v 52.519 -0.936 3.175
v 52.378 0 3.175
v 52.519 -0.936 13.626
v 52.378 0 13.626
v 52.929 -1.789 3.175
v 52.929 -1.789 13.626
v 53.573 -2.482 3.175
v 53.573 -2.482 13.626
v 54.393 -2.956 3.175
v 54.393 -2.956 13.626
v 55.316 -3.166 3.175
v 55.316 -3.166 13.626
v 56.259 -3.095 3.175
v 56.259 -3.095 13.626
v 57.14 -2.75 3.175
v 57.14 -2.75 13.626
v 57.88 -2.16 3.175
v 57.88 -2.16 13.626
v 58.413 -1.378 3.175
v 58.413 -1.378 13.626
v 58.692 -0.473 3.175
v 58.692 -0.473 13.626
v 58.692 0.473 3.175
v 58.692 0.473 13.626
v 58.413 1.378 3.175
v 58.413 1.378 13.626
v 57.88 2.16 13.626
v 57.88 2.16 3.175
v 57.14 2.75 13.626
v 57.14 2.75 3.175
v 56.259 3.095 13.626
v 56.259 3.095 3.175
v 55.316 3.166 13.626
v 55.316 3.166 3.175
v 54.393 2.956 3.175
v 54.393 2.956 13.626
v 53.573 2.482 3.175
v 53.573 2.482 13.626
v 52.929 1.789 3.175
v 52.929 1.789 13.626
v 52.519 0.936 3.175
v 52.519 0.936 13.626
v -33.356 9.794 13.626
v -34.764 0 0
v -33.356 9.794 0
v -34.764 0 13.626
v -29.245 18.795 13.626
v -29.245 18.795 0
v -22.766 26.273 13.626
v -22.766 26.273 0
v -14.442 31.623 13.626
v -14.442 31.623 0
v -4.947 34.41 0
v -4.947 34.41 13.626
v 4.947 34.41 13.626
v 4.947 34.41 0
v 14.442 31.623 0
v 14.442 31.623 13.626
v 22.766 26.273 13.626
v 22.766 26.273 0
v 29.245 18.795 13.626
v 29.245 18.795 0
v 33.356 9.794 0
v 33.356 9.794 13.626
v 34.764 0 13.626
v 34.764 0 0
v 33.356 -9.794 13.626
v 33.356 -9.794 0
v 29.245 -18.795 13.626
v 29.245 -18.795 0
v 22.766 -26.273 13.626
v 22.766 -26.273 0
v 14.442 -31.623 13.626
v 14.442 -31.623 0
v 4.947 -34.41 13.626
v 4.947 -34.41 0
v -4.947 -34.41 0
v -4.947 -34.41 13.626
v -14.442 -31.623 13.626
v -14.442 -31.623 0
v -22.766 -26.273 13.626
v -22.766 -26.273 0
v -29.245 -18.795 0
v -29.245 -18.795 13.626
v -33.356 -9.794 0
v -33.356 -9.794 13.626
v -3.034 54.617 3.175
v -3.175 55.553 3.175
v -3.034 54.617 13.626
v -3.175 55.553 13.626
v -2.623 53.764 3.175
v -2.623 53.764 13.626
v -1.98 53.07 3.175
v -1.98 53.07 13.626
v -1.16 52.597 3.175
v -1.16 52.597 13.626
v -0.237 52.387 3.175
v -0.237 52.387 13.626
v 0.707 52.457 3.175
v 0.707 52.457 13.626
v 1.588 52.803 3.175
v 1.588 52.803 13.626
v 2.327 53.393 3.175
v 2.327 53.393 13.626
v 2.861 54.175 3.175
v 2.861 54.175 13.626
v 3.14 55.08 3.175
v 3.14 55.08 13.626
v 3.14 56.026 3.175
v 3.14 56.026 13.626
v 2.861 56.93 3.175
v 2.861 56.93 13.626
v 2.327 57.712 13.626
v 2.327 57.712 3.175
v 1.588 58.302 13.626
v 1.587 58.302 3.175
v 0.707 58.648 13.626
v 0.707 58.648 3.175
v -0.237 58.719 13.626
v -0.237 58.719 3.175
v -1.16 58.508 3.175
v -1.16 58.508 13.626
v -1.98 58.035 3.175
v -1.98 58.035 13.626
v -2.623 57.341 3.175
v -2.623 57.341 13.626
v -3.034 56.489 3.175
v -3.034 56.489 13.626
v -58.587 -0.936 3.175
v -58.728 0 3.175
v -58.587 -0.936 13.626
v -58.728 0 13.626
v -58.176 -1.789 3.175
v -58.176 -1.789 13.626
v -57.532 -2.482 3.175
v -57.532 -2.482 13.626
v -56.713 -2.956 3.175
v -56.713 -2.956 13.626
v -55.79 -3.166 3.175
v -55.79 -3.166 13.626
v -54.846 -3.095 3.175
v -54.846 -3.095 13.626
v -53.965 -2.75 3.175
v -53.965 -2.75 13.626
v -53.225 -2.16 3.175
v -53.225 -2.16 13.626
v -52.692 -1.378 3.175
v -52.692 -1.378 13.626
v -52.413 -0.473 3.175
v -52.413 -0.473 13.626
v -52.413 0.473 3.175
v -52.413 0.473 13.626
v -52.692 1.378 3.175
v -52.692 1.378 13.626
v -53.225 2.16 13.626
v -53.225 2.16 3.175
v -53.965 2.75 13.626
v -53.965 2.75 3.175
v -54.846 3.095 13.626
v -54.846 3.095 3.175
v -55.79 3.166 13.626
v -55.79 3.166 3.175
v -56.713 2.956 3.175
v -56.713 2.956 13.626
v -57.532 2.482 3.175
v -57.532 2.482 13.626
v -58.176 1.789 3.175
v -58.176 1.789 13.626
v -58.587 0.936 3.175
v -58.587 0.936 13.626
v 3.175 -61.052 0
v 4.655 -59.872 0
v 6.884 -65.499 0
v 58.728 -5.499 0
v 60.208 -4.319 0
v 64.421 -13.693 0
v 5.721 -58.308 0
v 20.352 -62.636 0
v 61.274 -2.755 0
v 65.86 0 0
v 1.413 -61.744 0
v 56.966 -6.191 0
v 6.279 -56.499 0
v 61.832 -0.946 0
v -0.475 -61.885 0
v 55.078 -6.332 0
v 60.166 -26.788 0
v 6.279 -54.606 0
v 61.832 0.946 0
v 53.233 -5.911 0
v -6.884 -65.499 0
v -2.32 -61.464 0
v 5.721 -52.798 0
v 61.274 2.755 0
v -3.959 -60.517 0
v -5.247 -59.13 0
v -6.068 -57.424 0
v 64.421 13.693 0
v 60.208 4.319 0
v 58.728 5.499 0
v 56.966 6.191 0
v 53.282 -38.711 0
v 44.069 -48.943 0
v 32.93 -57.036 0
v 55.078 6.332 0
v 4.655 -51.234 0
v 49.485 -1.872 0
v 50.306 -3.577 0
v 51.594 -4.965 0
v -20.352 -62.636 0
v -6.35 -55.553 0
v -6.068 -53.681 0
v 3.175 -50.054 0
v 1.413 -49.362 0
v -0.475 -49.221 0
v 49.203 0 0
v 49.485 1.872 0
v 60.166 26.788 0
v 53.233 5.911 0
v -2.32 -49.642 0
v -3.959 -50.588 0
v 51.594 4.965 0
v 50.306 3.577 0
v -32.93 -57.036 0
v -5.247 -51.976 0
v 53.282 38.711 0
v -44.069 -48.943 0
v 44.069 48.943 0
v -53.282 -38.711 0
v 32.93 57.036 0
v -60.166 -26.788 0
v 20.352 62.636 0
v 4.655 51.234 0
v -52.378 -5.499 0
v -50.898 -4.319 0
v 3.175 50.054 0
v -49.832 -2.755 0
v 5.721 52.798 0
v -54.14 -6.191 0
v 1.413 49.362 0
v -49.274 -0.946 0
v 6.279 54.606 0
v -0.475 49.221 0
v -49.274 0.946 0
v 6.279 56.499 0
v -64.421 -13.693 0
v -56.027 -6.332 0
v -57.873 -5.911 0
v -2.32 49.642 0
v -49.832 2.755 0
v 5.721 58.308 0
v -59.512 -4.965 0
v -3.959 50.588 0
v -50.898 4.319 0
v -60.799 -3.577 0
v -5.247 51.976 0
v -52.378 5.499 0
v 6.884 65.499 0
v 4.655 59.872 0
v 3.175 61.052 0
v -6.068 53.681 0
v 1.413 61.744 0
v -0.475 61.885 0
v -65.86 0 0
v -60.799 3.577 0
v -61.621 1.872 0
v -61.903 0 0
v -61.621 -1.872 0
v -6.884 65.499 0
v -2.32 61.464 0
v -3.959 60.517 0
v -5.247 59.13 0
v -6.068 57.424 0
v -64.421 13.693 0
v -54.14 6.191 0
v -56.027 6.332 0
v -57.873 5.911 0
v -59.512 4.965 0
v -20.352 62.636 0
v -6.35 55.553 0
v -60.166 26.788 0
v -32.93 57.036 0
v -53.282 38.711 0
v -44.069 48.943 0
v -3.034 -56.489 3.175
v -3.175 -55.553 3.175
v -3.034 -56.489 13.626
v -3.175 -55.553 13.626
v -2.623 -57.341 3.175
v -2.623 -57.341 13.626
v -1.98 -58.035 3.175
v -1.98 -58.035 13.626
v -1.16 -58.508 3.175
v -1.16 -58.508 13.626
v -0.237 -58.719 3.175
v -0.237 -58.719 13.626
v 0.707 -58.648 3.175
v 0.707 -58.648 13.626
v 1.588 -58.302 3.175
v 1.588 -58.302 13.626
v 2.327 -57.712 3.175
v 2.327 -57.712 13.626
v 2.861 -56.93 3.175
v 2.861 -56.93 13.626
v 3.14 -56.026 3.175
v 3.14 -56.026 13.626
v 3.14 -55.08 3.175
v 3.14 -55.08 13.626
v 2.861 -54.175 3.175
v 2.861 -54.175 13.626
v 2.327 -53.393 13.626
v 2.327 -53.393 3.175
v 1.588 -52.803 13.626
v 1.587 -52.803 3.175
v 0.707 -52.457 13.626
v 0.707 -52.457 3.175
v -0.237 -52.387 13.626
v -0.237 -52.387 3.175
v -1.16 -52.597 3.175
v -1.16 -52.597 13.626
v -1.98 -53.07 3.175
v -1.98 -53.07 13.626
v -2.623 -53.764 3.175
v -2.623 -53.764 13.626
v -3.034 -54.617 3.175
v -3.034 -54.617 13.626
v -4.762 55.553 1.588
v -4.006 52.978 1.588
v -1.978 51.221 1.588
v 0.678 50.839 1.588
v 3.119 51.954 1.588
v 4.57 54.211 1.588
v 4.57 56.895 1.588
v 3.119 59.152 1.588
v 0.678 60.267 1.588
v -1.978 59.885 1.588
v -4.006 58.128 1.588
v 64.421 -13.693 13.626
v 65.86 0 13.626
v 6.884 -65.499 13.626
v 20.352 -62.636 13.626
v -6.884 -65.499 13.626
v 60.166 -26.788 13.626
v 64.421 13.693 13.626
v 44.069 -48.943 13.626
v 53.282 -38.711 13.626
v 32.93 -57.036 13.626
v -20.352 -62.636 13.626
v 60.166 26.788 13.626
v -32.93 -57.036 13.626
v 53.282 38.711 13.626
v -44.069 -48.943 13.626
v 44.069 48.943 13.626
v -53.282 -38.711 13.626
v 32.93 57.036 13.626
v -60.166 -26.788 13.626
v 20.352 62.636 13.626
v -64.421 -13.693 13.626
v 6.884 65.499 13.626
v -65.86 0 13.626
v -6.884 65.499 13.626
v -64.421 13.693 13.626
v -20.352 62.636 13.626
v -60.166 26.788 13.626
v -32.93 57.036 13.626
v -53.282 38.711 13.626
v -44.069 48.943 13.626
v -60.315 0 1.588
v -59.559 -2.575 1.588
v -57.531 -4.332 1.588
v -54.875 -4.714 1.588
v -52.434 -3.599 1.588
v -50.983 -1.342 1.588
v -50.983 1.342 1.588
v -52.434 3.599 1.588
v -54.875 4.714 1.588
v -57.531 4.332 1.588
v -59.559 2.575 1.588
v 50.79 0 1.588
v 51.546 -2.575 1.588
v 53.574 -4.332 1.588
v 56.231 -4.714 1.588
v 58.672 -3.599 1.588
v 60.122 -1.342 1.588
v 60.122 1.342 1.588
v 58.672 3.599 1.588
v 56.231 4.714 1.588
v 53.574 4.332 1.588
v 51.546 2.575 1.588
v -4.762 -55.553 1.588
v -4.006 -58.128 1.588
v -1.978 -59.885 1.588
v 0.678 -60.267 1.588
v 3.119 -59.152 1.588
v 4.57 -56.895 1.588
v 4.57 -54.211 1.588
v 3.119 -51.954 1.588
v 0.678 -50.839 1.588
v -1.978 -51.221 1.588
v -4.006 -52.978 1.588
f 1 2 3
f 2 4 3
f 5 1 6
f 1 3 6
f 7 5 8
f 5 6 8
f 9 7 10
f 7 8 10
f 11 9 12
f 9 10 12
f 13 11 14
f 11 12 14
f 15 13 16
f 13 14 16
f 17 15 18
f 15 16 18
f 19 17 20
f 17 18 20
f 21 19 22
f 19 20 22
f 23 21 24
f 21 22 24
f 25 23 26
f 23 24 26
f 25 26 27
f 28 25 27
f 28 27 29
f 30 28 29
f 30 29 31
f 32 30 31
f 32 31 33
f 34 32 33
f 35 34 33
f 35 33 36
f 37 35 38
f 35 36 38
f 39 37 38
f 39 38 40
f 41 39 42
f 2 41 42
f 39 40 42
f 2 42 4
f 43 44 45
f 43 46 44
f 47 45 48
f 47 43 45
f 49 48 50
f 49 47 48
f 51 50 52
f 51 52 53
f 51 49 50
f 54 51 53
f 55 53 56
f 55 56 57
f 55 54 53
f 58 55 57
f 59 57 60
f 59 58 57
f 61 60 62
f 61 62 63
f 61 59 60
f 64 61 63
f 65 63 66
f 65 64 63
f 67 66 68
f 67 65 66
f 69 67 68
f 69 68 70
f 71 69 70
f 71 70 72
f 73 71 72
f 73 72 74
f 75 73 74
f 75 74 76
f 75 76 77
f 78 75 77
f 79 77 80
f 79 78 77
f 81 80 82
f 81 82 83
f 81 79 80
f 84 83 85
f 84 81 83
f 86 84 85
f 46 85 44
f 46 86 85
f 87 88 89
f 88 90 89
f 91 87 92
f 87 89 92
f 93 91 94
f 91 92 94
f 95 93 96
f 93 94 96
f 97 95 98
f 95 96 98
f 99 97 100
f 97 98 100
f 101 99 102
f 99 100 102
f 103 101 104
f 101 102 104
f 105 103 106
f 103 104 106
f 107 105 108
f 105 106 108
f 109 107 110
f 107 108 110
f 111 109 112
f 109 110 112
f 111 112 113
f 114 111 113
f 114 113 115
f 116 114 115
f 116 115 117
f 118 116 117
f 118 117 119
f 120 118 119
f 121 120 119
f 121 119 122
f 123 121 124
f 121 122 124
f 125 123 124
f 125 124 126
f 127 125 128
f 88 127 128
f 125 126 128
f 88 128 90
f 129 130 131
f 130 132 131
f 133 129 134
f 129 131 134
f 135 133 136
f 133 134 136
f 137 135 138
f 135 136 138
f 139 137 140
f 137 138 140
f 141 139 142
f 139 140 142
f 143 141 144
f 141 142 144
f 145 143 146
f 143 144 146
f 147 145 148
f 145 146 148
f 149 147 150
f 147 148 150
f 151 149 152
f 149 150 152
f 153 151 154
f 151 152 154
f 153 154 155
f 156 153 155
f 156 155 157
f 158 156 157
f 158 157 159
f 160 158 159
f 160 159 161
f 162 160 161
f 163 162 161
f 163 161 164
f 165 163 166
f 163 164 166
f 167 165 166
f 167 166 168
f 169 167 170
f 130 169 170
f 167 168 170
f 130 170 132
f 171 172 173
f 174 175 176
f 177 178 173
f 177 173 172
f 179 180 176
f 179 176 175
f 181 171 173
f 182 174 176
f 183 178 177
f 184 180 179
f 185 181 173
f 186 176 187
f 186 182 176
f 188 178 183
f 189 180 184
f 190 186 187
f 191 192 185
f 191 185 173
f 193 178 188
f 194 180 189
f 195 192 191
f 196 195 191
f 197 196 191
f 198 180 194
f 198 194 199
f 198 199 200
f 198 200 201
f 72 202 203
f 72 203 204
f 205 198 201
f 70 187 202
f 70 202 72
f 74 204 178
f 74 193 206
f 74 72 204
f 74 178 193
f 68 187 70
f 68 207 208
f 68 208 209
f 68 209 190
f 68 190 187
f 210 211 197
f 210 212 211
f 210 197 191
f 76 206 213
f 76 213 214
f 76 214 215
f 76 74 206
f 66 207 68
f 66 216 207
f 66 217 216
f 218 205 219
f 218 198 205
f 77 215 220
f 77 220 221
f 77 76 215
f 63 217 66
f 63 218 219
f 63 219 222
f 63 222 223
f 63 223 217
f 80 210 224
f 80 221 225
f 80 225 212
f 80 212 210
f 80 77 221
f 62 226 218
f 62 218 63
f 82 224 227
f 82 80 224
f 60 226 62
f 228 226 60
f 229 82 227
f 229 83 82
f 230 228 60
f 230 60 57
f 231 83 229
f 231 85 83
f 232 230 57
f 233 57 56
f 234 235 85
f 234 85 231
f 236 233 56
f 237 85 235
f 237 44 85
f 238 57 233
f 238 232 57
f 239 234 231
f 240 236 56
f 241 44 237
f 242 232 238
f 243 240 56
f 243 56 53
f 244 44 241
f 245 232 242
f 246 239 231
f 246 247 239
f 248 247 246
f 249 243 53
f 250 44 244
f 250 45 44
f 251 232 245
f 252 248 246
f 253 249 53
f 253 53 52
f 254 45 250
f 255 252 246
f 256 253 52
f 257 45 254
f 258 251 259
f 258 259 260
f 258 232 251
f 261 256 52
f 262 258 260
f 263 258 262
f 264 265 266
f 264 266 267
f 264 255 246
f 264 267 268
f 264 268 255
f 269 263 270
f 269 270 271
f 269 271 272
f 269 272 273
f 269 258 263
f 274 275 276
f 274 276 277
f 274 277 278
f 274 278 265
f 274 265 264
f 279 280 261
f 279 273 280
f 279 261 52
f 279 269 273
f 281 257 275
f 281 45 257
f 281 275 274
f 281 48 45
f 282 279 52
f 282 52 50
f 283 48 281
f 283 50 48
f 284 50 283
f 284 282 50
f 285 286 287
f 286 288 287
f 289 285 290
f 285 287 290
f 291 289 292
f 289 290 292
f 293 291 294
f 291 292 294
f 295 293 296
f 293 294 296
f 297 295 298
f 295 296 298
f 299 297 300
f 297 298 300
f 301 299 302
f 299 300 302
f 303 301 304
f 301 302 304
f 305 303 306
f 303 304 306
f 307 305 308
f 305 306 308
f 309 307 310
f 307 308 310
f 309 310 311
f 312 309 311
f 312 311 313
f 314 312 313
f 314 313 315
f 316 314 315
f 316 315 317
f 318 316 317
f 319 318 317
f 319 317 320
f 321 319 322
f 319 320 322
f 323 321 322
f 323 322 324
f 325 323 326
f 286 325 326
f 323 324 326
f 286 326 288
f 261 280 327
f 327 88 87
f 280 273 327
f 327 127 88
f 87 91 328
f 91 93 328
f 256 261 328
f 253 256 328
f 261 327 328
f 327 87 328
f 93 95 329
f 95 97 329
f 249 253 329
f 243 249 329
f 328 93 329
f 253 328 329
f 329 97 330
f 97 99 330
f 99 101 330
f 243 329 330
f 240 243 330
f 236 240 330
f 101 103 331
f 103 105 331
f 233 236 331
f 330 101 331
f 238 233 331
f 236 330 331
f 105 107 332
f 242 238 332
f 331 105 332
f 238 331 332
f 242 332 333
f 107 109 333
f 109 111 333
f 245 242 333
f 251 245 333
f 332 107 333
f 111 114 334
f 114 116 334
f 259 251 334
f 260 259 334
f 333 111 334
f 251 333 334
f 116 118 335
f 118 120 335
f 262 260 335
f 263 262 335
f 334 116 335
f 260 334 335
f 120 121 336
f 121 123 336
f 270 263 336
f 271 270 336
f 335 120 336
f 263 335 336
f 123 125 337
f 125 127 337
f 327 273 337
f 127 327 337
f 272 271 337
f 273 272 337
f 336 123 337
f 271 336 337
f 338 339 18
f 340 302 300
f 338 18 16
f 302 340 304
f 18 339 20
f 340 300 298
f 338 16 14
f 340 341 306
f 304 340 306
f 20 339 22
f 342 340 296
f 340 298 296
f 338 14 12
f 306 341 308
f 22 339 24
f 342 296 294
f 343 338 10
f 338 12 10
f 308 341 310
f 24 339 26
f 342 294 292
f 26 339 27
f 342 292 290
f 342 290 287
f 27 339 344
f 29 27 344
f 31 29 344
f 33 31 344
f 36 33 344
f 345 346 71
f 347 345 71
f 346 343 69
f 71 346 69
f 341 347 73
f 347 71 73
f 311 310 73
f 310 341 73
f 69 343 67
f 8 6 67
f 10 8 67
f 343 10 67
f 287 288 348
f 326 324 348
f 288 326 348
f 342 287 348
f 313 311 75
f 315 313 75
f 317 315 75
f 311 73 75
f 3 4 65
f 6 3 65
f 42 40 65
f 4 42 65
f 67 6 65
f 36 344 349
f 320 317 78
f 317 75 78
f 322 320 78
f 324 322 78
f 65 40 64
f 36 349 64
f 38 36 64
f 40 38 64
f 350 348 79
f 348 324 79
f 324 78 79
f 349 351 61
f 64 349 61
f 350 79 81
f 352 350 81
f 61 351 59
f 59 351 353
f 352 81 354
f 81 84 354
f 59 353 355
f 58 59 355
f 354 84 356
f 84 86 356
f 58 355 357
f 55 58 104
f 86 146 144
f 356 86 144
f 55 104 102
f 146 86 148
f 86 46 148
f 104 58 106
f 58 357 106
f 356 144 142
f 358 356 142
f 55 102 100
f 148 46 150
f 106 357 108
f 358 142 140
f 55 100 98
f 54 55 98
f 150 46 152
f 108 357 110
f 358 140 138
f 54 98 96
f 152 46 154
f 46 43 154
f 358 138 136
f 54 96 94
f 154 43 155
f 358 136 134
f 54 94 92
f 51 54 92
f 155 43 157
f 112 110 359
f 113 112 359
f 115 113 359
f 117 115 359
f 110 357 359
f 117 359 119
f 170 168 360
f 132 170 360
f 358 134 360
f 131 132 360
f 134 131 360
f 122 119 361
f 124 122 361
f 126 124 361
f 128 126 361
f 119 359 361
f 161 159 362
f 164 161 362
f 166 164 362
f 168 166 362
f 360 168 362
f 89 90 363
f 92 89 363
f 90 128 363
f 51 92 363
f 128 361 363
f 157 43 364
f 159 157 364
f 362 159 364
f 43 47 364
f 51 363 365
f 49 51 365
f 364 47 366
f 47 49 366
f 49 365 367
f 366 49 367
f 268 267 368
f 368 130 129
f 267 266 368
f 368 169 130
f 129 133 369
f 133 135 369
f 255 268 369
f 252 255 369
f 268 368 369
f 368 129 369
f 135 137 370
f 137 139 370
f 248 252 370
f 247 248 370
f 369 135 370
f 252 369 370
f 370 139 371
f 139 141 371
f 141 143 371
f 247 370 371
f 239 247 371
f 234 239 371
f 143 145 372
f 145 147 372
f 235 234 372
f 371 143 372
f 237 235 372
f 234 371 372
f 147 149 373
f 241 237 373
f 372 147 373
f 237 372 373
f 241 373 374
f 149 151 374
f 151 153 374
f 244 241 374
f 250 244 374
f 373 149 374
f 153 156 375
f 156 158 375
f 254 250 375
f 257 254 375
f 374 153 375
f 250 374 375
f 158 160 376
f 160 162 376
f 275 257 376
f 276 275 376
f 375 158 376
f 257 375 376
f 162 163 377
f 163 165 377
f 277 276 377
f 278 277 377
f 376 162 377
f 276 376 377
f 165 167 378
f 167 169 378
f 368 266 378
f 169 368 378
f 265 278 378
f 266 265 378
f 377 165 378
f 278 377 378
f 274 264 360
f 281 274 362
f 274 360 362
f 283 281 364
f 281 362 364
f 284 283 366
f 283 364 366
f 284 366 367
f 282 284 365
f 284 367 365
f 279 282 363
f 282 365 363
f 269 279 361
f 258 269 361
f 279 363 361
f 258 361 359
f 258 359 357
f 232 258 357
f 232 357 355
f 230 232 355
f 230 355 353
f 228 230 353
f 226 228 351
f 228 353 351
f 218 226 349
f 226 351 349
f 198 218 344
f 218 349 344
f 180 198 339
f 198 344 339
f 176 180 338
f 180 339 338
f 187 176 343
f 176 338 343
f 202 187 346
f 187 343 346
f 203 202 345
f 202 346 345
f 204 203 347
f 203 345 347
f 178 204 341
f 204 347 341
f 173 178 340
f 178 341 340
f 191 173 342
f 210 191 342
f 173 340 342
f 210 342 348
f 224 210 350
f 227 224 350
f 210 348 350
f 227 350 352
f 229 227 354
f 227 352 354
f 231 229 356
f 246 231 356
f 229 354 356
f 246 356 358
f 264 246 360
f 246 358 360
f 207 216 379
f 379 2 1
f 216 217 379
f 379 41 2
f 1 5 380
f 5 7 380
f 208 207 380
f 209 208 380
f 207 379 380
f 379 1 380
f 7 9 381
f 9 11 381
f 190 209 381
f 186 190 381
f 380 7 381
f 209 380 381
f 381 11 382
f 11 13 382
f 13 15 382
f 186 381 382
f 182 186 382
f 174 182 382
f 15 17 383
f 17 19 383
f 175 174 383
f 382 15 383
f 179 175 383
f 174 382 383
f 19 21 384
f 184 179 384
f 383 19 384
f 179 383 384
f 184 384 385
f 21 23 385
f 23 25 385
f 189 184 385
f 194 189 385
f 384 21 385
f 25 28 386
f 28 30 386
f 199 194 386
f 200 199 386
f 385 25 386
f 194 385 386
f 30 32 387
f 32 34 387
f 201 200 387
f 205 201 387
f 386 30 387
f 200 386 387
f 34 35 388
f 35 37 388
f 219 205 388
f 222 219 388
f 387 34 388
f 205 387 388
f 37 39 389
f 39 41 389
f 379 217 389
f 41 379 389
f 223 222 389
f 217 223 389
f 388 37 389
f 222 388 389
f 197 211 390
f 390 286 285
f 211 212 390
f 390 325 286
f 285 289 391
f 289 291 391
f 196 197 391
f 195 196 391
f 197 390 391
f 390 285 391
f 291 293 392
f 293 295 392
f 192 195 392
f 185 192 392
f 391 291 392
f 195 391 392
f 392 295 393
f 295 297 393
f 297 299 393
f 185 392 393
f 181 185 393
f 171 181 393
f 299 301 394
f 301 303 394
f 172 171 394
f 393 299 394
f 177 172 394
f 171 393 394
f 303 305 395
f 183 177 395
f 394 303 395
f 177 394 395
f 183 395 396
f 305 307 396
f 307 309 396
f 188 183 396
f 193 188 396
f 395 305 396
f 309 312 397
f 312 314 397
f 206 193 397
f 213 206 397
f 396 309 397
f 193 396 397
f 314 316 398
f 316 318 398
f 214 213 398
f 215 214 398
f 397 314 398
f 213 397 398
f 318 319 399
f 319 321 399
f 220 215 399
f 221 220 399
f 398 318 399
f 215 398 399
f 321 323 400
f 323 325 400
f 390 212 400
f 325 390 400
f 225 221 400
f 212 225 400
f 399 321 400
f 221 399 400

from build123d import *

# Parameters (mm, degrees)
F0_W           = 31.095594
F0_H           = 13.626158
F3_D           = 6.35
F3_CSINK_D     = 12.7
F3_CSINK_ANGLE = 90


with BuildPart() as f1:
    # F0 (on Front) → F1 (revolve)
    with BuildSketch(Plane.XZ):
        with Locations((-50.311968, 6.813079)):
            Rectangle(F0_W, F0_H)
    revolve(axis=Axis((0, 0, -5.066134), (0, 0, -1)))

    # F3 (through all)
    with Locations(Plane(origin=(0, 0, 0), x_dir=(1, 0, 0), z_dir=(0, 0, -1))):
        with Locations((55.552796, 0), (0, 55.552796), (-55.552796, 0), (0, -55.552796)):
            CounterSinkHole(F3_D / 2, F3_CSINK_D / 2, counter_sink_angle=F3_CSINK_ANGLE)


solid = f1.part
